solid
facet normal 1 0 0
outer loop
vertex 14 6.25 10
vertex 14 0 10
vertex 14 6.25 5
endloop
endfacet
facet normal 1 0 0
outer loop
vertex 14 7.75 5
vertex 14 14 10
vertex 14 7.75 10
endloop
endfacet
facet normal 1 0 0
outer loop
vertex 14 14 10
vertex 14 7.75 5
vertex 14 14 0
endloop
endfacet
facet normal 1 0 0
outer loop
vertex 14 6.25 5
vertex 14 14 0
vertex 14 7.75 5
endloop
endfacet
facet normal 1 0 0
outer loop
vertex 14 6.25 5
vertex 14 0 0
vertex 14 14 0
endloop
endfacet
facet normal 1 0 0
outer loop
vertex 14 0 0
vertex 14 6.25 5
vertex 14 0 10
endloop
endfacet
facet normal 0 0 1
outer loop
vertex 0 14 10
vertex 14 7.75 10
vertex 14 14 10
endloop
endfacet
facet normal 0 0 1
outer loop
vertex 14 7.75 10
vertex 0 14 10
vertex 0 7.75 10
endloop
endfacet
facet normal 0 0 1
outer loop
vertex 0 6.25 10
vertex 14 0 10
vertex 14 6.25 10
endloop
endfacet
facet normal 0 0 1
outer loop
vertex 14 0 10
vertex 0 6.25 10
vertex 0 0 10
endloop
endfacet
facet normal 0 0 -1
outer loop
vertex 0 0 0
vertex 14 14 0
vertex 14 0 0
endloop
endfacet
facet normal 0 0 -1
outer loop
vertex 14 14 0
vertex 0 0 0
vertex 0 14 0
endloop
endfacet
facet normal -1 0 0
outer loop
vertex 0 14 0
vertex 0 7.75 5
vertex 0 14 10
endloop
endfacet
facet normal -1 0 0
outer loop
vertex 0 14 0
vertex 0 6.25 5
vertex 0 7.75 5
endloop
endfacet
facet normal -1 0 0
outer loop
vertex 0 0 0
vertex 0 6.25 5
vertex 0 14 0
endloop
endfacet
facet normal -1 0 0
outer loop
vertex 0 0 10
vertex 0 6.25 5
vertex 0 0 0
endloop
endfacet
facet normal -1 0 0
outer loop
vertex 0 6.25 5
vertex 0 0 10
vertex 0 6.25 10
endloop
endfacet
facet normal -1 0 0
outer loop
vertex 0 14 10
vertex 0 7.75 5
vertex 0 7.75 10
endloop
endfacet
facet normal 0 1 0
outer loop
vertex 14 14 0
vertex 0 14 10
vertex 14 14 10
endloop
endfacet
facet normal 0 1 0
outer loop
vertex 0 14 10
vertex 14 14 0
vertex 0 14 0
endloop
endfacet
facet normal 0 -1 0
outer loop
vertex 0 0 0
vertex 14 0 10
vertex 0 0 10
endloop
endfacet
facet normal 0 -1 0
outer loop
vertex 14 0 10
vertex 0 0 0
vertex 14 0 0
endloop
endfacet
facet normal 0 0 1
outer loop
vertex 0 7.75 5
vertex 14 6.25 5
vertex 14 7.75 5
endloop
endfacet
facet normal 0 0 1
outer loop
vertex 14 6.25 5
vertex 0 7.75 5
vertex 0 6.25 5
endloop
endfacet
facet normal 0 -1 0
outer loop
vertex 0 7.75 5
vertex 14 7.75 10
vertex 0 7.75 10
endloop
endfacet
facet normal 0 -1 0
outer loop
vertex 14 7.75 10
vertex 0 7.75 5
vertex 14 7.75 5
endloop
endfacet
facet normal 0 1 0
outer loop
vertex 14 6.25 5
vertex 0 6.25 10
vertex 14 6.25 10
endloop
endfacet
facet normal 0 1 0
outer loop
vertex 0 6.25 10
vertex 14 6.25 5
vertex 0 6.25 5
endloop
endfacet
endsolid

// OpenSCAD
$fn = 32;

// ----------------------------------------------------------------------
// Micro clip: slotted block, 5-20 mm class
// ----------------------------------------------------------------------

// --- parameters (mm) ---
block_l = 14;             // block length, X
block_w = 14;             // block width, Y
block_h = 10;             // block height, Z
slot_w = 1.5;             // slot width
slot_d = 5;               // slot depth from the top

difference() {
  cube([block_l, block_w, block_h]);
  translate([-1, block_w / 2 - slot_w / 2, block_h - slot_d])
    cube([block_l + 2, slot_w, slot_d + 1]);
}
